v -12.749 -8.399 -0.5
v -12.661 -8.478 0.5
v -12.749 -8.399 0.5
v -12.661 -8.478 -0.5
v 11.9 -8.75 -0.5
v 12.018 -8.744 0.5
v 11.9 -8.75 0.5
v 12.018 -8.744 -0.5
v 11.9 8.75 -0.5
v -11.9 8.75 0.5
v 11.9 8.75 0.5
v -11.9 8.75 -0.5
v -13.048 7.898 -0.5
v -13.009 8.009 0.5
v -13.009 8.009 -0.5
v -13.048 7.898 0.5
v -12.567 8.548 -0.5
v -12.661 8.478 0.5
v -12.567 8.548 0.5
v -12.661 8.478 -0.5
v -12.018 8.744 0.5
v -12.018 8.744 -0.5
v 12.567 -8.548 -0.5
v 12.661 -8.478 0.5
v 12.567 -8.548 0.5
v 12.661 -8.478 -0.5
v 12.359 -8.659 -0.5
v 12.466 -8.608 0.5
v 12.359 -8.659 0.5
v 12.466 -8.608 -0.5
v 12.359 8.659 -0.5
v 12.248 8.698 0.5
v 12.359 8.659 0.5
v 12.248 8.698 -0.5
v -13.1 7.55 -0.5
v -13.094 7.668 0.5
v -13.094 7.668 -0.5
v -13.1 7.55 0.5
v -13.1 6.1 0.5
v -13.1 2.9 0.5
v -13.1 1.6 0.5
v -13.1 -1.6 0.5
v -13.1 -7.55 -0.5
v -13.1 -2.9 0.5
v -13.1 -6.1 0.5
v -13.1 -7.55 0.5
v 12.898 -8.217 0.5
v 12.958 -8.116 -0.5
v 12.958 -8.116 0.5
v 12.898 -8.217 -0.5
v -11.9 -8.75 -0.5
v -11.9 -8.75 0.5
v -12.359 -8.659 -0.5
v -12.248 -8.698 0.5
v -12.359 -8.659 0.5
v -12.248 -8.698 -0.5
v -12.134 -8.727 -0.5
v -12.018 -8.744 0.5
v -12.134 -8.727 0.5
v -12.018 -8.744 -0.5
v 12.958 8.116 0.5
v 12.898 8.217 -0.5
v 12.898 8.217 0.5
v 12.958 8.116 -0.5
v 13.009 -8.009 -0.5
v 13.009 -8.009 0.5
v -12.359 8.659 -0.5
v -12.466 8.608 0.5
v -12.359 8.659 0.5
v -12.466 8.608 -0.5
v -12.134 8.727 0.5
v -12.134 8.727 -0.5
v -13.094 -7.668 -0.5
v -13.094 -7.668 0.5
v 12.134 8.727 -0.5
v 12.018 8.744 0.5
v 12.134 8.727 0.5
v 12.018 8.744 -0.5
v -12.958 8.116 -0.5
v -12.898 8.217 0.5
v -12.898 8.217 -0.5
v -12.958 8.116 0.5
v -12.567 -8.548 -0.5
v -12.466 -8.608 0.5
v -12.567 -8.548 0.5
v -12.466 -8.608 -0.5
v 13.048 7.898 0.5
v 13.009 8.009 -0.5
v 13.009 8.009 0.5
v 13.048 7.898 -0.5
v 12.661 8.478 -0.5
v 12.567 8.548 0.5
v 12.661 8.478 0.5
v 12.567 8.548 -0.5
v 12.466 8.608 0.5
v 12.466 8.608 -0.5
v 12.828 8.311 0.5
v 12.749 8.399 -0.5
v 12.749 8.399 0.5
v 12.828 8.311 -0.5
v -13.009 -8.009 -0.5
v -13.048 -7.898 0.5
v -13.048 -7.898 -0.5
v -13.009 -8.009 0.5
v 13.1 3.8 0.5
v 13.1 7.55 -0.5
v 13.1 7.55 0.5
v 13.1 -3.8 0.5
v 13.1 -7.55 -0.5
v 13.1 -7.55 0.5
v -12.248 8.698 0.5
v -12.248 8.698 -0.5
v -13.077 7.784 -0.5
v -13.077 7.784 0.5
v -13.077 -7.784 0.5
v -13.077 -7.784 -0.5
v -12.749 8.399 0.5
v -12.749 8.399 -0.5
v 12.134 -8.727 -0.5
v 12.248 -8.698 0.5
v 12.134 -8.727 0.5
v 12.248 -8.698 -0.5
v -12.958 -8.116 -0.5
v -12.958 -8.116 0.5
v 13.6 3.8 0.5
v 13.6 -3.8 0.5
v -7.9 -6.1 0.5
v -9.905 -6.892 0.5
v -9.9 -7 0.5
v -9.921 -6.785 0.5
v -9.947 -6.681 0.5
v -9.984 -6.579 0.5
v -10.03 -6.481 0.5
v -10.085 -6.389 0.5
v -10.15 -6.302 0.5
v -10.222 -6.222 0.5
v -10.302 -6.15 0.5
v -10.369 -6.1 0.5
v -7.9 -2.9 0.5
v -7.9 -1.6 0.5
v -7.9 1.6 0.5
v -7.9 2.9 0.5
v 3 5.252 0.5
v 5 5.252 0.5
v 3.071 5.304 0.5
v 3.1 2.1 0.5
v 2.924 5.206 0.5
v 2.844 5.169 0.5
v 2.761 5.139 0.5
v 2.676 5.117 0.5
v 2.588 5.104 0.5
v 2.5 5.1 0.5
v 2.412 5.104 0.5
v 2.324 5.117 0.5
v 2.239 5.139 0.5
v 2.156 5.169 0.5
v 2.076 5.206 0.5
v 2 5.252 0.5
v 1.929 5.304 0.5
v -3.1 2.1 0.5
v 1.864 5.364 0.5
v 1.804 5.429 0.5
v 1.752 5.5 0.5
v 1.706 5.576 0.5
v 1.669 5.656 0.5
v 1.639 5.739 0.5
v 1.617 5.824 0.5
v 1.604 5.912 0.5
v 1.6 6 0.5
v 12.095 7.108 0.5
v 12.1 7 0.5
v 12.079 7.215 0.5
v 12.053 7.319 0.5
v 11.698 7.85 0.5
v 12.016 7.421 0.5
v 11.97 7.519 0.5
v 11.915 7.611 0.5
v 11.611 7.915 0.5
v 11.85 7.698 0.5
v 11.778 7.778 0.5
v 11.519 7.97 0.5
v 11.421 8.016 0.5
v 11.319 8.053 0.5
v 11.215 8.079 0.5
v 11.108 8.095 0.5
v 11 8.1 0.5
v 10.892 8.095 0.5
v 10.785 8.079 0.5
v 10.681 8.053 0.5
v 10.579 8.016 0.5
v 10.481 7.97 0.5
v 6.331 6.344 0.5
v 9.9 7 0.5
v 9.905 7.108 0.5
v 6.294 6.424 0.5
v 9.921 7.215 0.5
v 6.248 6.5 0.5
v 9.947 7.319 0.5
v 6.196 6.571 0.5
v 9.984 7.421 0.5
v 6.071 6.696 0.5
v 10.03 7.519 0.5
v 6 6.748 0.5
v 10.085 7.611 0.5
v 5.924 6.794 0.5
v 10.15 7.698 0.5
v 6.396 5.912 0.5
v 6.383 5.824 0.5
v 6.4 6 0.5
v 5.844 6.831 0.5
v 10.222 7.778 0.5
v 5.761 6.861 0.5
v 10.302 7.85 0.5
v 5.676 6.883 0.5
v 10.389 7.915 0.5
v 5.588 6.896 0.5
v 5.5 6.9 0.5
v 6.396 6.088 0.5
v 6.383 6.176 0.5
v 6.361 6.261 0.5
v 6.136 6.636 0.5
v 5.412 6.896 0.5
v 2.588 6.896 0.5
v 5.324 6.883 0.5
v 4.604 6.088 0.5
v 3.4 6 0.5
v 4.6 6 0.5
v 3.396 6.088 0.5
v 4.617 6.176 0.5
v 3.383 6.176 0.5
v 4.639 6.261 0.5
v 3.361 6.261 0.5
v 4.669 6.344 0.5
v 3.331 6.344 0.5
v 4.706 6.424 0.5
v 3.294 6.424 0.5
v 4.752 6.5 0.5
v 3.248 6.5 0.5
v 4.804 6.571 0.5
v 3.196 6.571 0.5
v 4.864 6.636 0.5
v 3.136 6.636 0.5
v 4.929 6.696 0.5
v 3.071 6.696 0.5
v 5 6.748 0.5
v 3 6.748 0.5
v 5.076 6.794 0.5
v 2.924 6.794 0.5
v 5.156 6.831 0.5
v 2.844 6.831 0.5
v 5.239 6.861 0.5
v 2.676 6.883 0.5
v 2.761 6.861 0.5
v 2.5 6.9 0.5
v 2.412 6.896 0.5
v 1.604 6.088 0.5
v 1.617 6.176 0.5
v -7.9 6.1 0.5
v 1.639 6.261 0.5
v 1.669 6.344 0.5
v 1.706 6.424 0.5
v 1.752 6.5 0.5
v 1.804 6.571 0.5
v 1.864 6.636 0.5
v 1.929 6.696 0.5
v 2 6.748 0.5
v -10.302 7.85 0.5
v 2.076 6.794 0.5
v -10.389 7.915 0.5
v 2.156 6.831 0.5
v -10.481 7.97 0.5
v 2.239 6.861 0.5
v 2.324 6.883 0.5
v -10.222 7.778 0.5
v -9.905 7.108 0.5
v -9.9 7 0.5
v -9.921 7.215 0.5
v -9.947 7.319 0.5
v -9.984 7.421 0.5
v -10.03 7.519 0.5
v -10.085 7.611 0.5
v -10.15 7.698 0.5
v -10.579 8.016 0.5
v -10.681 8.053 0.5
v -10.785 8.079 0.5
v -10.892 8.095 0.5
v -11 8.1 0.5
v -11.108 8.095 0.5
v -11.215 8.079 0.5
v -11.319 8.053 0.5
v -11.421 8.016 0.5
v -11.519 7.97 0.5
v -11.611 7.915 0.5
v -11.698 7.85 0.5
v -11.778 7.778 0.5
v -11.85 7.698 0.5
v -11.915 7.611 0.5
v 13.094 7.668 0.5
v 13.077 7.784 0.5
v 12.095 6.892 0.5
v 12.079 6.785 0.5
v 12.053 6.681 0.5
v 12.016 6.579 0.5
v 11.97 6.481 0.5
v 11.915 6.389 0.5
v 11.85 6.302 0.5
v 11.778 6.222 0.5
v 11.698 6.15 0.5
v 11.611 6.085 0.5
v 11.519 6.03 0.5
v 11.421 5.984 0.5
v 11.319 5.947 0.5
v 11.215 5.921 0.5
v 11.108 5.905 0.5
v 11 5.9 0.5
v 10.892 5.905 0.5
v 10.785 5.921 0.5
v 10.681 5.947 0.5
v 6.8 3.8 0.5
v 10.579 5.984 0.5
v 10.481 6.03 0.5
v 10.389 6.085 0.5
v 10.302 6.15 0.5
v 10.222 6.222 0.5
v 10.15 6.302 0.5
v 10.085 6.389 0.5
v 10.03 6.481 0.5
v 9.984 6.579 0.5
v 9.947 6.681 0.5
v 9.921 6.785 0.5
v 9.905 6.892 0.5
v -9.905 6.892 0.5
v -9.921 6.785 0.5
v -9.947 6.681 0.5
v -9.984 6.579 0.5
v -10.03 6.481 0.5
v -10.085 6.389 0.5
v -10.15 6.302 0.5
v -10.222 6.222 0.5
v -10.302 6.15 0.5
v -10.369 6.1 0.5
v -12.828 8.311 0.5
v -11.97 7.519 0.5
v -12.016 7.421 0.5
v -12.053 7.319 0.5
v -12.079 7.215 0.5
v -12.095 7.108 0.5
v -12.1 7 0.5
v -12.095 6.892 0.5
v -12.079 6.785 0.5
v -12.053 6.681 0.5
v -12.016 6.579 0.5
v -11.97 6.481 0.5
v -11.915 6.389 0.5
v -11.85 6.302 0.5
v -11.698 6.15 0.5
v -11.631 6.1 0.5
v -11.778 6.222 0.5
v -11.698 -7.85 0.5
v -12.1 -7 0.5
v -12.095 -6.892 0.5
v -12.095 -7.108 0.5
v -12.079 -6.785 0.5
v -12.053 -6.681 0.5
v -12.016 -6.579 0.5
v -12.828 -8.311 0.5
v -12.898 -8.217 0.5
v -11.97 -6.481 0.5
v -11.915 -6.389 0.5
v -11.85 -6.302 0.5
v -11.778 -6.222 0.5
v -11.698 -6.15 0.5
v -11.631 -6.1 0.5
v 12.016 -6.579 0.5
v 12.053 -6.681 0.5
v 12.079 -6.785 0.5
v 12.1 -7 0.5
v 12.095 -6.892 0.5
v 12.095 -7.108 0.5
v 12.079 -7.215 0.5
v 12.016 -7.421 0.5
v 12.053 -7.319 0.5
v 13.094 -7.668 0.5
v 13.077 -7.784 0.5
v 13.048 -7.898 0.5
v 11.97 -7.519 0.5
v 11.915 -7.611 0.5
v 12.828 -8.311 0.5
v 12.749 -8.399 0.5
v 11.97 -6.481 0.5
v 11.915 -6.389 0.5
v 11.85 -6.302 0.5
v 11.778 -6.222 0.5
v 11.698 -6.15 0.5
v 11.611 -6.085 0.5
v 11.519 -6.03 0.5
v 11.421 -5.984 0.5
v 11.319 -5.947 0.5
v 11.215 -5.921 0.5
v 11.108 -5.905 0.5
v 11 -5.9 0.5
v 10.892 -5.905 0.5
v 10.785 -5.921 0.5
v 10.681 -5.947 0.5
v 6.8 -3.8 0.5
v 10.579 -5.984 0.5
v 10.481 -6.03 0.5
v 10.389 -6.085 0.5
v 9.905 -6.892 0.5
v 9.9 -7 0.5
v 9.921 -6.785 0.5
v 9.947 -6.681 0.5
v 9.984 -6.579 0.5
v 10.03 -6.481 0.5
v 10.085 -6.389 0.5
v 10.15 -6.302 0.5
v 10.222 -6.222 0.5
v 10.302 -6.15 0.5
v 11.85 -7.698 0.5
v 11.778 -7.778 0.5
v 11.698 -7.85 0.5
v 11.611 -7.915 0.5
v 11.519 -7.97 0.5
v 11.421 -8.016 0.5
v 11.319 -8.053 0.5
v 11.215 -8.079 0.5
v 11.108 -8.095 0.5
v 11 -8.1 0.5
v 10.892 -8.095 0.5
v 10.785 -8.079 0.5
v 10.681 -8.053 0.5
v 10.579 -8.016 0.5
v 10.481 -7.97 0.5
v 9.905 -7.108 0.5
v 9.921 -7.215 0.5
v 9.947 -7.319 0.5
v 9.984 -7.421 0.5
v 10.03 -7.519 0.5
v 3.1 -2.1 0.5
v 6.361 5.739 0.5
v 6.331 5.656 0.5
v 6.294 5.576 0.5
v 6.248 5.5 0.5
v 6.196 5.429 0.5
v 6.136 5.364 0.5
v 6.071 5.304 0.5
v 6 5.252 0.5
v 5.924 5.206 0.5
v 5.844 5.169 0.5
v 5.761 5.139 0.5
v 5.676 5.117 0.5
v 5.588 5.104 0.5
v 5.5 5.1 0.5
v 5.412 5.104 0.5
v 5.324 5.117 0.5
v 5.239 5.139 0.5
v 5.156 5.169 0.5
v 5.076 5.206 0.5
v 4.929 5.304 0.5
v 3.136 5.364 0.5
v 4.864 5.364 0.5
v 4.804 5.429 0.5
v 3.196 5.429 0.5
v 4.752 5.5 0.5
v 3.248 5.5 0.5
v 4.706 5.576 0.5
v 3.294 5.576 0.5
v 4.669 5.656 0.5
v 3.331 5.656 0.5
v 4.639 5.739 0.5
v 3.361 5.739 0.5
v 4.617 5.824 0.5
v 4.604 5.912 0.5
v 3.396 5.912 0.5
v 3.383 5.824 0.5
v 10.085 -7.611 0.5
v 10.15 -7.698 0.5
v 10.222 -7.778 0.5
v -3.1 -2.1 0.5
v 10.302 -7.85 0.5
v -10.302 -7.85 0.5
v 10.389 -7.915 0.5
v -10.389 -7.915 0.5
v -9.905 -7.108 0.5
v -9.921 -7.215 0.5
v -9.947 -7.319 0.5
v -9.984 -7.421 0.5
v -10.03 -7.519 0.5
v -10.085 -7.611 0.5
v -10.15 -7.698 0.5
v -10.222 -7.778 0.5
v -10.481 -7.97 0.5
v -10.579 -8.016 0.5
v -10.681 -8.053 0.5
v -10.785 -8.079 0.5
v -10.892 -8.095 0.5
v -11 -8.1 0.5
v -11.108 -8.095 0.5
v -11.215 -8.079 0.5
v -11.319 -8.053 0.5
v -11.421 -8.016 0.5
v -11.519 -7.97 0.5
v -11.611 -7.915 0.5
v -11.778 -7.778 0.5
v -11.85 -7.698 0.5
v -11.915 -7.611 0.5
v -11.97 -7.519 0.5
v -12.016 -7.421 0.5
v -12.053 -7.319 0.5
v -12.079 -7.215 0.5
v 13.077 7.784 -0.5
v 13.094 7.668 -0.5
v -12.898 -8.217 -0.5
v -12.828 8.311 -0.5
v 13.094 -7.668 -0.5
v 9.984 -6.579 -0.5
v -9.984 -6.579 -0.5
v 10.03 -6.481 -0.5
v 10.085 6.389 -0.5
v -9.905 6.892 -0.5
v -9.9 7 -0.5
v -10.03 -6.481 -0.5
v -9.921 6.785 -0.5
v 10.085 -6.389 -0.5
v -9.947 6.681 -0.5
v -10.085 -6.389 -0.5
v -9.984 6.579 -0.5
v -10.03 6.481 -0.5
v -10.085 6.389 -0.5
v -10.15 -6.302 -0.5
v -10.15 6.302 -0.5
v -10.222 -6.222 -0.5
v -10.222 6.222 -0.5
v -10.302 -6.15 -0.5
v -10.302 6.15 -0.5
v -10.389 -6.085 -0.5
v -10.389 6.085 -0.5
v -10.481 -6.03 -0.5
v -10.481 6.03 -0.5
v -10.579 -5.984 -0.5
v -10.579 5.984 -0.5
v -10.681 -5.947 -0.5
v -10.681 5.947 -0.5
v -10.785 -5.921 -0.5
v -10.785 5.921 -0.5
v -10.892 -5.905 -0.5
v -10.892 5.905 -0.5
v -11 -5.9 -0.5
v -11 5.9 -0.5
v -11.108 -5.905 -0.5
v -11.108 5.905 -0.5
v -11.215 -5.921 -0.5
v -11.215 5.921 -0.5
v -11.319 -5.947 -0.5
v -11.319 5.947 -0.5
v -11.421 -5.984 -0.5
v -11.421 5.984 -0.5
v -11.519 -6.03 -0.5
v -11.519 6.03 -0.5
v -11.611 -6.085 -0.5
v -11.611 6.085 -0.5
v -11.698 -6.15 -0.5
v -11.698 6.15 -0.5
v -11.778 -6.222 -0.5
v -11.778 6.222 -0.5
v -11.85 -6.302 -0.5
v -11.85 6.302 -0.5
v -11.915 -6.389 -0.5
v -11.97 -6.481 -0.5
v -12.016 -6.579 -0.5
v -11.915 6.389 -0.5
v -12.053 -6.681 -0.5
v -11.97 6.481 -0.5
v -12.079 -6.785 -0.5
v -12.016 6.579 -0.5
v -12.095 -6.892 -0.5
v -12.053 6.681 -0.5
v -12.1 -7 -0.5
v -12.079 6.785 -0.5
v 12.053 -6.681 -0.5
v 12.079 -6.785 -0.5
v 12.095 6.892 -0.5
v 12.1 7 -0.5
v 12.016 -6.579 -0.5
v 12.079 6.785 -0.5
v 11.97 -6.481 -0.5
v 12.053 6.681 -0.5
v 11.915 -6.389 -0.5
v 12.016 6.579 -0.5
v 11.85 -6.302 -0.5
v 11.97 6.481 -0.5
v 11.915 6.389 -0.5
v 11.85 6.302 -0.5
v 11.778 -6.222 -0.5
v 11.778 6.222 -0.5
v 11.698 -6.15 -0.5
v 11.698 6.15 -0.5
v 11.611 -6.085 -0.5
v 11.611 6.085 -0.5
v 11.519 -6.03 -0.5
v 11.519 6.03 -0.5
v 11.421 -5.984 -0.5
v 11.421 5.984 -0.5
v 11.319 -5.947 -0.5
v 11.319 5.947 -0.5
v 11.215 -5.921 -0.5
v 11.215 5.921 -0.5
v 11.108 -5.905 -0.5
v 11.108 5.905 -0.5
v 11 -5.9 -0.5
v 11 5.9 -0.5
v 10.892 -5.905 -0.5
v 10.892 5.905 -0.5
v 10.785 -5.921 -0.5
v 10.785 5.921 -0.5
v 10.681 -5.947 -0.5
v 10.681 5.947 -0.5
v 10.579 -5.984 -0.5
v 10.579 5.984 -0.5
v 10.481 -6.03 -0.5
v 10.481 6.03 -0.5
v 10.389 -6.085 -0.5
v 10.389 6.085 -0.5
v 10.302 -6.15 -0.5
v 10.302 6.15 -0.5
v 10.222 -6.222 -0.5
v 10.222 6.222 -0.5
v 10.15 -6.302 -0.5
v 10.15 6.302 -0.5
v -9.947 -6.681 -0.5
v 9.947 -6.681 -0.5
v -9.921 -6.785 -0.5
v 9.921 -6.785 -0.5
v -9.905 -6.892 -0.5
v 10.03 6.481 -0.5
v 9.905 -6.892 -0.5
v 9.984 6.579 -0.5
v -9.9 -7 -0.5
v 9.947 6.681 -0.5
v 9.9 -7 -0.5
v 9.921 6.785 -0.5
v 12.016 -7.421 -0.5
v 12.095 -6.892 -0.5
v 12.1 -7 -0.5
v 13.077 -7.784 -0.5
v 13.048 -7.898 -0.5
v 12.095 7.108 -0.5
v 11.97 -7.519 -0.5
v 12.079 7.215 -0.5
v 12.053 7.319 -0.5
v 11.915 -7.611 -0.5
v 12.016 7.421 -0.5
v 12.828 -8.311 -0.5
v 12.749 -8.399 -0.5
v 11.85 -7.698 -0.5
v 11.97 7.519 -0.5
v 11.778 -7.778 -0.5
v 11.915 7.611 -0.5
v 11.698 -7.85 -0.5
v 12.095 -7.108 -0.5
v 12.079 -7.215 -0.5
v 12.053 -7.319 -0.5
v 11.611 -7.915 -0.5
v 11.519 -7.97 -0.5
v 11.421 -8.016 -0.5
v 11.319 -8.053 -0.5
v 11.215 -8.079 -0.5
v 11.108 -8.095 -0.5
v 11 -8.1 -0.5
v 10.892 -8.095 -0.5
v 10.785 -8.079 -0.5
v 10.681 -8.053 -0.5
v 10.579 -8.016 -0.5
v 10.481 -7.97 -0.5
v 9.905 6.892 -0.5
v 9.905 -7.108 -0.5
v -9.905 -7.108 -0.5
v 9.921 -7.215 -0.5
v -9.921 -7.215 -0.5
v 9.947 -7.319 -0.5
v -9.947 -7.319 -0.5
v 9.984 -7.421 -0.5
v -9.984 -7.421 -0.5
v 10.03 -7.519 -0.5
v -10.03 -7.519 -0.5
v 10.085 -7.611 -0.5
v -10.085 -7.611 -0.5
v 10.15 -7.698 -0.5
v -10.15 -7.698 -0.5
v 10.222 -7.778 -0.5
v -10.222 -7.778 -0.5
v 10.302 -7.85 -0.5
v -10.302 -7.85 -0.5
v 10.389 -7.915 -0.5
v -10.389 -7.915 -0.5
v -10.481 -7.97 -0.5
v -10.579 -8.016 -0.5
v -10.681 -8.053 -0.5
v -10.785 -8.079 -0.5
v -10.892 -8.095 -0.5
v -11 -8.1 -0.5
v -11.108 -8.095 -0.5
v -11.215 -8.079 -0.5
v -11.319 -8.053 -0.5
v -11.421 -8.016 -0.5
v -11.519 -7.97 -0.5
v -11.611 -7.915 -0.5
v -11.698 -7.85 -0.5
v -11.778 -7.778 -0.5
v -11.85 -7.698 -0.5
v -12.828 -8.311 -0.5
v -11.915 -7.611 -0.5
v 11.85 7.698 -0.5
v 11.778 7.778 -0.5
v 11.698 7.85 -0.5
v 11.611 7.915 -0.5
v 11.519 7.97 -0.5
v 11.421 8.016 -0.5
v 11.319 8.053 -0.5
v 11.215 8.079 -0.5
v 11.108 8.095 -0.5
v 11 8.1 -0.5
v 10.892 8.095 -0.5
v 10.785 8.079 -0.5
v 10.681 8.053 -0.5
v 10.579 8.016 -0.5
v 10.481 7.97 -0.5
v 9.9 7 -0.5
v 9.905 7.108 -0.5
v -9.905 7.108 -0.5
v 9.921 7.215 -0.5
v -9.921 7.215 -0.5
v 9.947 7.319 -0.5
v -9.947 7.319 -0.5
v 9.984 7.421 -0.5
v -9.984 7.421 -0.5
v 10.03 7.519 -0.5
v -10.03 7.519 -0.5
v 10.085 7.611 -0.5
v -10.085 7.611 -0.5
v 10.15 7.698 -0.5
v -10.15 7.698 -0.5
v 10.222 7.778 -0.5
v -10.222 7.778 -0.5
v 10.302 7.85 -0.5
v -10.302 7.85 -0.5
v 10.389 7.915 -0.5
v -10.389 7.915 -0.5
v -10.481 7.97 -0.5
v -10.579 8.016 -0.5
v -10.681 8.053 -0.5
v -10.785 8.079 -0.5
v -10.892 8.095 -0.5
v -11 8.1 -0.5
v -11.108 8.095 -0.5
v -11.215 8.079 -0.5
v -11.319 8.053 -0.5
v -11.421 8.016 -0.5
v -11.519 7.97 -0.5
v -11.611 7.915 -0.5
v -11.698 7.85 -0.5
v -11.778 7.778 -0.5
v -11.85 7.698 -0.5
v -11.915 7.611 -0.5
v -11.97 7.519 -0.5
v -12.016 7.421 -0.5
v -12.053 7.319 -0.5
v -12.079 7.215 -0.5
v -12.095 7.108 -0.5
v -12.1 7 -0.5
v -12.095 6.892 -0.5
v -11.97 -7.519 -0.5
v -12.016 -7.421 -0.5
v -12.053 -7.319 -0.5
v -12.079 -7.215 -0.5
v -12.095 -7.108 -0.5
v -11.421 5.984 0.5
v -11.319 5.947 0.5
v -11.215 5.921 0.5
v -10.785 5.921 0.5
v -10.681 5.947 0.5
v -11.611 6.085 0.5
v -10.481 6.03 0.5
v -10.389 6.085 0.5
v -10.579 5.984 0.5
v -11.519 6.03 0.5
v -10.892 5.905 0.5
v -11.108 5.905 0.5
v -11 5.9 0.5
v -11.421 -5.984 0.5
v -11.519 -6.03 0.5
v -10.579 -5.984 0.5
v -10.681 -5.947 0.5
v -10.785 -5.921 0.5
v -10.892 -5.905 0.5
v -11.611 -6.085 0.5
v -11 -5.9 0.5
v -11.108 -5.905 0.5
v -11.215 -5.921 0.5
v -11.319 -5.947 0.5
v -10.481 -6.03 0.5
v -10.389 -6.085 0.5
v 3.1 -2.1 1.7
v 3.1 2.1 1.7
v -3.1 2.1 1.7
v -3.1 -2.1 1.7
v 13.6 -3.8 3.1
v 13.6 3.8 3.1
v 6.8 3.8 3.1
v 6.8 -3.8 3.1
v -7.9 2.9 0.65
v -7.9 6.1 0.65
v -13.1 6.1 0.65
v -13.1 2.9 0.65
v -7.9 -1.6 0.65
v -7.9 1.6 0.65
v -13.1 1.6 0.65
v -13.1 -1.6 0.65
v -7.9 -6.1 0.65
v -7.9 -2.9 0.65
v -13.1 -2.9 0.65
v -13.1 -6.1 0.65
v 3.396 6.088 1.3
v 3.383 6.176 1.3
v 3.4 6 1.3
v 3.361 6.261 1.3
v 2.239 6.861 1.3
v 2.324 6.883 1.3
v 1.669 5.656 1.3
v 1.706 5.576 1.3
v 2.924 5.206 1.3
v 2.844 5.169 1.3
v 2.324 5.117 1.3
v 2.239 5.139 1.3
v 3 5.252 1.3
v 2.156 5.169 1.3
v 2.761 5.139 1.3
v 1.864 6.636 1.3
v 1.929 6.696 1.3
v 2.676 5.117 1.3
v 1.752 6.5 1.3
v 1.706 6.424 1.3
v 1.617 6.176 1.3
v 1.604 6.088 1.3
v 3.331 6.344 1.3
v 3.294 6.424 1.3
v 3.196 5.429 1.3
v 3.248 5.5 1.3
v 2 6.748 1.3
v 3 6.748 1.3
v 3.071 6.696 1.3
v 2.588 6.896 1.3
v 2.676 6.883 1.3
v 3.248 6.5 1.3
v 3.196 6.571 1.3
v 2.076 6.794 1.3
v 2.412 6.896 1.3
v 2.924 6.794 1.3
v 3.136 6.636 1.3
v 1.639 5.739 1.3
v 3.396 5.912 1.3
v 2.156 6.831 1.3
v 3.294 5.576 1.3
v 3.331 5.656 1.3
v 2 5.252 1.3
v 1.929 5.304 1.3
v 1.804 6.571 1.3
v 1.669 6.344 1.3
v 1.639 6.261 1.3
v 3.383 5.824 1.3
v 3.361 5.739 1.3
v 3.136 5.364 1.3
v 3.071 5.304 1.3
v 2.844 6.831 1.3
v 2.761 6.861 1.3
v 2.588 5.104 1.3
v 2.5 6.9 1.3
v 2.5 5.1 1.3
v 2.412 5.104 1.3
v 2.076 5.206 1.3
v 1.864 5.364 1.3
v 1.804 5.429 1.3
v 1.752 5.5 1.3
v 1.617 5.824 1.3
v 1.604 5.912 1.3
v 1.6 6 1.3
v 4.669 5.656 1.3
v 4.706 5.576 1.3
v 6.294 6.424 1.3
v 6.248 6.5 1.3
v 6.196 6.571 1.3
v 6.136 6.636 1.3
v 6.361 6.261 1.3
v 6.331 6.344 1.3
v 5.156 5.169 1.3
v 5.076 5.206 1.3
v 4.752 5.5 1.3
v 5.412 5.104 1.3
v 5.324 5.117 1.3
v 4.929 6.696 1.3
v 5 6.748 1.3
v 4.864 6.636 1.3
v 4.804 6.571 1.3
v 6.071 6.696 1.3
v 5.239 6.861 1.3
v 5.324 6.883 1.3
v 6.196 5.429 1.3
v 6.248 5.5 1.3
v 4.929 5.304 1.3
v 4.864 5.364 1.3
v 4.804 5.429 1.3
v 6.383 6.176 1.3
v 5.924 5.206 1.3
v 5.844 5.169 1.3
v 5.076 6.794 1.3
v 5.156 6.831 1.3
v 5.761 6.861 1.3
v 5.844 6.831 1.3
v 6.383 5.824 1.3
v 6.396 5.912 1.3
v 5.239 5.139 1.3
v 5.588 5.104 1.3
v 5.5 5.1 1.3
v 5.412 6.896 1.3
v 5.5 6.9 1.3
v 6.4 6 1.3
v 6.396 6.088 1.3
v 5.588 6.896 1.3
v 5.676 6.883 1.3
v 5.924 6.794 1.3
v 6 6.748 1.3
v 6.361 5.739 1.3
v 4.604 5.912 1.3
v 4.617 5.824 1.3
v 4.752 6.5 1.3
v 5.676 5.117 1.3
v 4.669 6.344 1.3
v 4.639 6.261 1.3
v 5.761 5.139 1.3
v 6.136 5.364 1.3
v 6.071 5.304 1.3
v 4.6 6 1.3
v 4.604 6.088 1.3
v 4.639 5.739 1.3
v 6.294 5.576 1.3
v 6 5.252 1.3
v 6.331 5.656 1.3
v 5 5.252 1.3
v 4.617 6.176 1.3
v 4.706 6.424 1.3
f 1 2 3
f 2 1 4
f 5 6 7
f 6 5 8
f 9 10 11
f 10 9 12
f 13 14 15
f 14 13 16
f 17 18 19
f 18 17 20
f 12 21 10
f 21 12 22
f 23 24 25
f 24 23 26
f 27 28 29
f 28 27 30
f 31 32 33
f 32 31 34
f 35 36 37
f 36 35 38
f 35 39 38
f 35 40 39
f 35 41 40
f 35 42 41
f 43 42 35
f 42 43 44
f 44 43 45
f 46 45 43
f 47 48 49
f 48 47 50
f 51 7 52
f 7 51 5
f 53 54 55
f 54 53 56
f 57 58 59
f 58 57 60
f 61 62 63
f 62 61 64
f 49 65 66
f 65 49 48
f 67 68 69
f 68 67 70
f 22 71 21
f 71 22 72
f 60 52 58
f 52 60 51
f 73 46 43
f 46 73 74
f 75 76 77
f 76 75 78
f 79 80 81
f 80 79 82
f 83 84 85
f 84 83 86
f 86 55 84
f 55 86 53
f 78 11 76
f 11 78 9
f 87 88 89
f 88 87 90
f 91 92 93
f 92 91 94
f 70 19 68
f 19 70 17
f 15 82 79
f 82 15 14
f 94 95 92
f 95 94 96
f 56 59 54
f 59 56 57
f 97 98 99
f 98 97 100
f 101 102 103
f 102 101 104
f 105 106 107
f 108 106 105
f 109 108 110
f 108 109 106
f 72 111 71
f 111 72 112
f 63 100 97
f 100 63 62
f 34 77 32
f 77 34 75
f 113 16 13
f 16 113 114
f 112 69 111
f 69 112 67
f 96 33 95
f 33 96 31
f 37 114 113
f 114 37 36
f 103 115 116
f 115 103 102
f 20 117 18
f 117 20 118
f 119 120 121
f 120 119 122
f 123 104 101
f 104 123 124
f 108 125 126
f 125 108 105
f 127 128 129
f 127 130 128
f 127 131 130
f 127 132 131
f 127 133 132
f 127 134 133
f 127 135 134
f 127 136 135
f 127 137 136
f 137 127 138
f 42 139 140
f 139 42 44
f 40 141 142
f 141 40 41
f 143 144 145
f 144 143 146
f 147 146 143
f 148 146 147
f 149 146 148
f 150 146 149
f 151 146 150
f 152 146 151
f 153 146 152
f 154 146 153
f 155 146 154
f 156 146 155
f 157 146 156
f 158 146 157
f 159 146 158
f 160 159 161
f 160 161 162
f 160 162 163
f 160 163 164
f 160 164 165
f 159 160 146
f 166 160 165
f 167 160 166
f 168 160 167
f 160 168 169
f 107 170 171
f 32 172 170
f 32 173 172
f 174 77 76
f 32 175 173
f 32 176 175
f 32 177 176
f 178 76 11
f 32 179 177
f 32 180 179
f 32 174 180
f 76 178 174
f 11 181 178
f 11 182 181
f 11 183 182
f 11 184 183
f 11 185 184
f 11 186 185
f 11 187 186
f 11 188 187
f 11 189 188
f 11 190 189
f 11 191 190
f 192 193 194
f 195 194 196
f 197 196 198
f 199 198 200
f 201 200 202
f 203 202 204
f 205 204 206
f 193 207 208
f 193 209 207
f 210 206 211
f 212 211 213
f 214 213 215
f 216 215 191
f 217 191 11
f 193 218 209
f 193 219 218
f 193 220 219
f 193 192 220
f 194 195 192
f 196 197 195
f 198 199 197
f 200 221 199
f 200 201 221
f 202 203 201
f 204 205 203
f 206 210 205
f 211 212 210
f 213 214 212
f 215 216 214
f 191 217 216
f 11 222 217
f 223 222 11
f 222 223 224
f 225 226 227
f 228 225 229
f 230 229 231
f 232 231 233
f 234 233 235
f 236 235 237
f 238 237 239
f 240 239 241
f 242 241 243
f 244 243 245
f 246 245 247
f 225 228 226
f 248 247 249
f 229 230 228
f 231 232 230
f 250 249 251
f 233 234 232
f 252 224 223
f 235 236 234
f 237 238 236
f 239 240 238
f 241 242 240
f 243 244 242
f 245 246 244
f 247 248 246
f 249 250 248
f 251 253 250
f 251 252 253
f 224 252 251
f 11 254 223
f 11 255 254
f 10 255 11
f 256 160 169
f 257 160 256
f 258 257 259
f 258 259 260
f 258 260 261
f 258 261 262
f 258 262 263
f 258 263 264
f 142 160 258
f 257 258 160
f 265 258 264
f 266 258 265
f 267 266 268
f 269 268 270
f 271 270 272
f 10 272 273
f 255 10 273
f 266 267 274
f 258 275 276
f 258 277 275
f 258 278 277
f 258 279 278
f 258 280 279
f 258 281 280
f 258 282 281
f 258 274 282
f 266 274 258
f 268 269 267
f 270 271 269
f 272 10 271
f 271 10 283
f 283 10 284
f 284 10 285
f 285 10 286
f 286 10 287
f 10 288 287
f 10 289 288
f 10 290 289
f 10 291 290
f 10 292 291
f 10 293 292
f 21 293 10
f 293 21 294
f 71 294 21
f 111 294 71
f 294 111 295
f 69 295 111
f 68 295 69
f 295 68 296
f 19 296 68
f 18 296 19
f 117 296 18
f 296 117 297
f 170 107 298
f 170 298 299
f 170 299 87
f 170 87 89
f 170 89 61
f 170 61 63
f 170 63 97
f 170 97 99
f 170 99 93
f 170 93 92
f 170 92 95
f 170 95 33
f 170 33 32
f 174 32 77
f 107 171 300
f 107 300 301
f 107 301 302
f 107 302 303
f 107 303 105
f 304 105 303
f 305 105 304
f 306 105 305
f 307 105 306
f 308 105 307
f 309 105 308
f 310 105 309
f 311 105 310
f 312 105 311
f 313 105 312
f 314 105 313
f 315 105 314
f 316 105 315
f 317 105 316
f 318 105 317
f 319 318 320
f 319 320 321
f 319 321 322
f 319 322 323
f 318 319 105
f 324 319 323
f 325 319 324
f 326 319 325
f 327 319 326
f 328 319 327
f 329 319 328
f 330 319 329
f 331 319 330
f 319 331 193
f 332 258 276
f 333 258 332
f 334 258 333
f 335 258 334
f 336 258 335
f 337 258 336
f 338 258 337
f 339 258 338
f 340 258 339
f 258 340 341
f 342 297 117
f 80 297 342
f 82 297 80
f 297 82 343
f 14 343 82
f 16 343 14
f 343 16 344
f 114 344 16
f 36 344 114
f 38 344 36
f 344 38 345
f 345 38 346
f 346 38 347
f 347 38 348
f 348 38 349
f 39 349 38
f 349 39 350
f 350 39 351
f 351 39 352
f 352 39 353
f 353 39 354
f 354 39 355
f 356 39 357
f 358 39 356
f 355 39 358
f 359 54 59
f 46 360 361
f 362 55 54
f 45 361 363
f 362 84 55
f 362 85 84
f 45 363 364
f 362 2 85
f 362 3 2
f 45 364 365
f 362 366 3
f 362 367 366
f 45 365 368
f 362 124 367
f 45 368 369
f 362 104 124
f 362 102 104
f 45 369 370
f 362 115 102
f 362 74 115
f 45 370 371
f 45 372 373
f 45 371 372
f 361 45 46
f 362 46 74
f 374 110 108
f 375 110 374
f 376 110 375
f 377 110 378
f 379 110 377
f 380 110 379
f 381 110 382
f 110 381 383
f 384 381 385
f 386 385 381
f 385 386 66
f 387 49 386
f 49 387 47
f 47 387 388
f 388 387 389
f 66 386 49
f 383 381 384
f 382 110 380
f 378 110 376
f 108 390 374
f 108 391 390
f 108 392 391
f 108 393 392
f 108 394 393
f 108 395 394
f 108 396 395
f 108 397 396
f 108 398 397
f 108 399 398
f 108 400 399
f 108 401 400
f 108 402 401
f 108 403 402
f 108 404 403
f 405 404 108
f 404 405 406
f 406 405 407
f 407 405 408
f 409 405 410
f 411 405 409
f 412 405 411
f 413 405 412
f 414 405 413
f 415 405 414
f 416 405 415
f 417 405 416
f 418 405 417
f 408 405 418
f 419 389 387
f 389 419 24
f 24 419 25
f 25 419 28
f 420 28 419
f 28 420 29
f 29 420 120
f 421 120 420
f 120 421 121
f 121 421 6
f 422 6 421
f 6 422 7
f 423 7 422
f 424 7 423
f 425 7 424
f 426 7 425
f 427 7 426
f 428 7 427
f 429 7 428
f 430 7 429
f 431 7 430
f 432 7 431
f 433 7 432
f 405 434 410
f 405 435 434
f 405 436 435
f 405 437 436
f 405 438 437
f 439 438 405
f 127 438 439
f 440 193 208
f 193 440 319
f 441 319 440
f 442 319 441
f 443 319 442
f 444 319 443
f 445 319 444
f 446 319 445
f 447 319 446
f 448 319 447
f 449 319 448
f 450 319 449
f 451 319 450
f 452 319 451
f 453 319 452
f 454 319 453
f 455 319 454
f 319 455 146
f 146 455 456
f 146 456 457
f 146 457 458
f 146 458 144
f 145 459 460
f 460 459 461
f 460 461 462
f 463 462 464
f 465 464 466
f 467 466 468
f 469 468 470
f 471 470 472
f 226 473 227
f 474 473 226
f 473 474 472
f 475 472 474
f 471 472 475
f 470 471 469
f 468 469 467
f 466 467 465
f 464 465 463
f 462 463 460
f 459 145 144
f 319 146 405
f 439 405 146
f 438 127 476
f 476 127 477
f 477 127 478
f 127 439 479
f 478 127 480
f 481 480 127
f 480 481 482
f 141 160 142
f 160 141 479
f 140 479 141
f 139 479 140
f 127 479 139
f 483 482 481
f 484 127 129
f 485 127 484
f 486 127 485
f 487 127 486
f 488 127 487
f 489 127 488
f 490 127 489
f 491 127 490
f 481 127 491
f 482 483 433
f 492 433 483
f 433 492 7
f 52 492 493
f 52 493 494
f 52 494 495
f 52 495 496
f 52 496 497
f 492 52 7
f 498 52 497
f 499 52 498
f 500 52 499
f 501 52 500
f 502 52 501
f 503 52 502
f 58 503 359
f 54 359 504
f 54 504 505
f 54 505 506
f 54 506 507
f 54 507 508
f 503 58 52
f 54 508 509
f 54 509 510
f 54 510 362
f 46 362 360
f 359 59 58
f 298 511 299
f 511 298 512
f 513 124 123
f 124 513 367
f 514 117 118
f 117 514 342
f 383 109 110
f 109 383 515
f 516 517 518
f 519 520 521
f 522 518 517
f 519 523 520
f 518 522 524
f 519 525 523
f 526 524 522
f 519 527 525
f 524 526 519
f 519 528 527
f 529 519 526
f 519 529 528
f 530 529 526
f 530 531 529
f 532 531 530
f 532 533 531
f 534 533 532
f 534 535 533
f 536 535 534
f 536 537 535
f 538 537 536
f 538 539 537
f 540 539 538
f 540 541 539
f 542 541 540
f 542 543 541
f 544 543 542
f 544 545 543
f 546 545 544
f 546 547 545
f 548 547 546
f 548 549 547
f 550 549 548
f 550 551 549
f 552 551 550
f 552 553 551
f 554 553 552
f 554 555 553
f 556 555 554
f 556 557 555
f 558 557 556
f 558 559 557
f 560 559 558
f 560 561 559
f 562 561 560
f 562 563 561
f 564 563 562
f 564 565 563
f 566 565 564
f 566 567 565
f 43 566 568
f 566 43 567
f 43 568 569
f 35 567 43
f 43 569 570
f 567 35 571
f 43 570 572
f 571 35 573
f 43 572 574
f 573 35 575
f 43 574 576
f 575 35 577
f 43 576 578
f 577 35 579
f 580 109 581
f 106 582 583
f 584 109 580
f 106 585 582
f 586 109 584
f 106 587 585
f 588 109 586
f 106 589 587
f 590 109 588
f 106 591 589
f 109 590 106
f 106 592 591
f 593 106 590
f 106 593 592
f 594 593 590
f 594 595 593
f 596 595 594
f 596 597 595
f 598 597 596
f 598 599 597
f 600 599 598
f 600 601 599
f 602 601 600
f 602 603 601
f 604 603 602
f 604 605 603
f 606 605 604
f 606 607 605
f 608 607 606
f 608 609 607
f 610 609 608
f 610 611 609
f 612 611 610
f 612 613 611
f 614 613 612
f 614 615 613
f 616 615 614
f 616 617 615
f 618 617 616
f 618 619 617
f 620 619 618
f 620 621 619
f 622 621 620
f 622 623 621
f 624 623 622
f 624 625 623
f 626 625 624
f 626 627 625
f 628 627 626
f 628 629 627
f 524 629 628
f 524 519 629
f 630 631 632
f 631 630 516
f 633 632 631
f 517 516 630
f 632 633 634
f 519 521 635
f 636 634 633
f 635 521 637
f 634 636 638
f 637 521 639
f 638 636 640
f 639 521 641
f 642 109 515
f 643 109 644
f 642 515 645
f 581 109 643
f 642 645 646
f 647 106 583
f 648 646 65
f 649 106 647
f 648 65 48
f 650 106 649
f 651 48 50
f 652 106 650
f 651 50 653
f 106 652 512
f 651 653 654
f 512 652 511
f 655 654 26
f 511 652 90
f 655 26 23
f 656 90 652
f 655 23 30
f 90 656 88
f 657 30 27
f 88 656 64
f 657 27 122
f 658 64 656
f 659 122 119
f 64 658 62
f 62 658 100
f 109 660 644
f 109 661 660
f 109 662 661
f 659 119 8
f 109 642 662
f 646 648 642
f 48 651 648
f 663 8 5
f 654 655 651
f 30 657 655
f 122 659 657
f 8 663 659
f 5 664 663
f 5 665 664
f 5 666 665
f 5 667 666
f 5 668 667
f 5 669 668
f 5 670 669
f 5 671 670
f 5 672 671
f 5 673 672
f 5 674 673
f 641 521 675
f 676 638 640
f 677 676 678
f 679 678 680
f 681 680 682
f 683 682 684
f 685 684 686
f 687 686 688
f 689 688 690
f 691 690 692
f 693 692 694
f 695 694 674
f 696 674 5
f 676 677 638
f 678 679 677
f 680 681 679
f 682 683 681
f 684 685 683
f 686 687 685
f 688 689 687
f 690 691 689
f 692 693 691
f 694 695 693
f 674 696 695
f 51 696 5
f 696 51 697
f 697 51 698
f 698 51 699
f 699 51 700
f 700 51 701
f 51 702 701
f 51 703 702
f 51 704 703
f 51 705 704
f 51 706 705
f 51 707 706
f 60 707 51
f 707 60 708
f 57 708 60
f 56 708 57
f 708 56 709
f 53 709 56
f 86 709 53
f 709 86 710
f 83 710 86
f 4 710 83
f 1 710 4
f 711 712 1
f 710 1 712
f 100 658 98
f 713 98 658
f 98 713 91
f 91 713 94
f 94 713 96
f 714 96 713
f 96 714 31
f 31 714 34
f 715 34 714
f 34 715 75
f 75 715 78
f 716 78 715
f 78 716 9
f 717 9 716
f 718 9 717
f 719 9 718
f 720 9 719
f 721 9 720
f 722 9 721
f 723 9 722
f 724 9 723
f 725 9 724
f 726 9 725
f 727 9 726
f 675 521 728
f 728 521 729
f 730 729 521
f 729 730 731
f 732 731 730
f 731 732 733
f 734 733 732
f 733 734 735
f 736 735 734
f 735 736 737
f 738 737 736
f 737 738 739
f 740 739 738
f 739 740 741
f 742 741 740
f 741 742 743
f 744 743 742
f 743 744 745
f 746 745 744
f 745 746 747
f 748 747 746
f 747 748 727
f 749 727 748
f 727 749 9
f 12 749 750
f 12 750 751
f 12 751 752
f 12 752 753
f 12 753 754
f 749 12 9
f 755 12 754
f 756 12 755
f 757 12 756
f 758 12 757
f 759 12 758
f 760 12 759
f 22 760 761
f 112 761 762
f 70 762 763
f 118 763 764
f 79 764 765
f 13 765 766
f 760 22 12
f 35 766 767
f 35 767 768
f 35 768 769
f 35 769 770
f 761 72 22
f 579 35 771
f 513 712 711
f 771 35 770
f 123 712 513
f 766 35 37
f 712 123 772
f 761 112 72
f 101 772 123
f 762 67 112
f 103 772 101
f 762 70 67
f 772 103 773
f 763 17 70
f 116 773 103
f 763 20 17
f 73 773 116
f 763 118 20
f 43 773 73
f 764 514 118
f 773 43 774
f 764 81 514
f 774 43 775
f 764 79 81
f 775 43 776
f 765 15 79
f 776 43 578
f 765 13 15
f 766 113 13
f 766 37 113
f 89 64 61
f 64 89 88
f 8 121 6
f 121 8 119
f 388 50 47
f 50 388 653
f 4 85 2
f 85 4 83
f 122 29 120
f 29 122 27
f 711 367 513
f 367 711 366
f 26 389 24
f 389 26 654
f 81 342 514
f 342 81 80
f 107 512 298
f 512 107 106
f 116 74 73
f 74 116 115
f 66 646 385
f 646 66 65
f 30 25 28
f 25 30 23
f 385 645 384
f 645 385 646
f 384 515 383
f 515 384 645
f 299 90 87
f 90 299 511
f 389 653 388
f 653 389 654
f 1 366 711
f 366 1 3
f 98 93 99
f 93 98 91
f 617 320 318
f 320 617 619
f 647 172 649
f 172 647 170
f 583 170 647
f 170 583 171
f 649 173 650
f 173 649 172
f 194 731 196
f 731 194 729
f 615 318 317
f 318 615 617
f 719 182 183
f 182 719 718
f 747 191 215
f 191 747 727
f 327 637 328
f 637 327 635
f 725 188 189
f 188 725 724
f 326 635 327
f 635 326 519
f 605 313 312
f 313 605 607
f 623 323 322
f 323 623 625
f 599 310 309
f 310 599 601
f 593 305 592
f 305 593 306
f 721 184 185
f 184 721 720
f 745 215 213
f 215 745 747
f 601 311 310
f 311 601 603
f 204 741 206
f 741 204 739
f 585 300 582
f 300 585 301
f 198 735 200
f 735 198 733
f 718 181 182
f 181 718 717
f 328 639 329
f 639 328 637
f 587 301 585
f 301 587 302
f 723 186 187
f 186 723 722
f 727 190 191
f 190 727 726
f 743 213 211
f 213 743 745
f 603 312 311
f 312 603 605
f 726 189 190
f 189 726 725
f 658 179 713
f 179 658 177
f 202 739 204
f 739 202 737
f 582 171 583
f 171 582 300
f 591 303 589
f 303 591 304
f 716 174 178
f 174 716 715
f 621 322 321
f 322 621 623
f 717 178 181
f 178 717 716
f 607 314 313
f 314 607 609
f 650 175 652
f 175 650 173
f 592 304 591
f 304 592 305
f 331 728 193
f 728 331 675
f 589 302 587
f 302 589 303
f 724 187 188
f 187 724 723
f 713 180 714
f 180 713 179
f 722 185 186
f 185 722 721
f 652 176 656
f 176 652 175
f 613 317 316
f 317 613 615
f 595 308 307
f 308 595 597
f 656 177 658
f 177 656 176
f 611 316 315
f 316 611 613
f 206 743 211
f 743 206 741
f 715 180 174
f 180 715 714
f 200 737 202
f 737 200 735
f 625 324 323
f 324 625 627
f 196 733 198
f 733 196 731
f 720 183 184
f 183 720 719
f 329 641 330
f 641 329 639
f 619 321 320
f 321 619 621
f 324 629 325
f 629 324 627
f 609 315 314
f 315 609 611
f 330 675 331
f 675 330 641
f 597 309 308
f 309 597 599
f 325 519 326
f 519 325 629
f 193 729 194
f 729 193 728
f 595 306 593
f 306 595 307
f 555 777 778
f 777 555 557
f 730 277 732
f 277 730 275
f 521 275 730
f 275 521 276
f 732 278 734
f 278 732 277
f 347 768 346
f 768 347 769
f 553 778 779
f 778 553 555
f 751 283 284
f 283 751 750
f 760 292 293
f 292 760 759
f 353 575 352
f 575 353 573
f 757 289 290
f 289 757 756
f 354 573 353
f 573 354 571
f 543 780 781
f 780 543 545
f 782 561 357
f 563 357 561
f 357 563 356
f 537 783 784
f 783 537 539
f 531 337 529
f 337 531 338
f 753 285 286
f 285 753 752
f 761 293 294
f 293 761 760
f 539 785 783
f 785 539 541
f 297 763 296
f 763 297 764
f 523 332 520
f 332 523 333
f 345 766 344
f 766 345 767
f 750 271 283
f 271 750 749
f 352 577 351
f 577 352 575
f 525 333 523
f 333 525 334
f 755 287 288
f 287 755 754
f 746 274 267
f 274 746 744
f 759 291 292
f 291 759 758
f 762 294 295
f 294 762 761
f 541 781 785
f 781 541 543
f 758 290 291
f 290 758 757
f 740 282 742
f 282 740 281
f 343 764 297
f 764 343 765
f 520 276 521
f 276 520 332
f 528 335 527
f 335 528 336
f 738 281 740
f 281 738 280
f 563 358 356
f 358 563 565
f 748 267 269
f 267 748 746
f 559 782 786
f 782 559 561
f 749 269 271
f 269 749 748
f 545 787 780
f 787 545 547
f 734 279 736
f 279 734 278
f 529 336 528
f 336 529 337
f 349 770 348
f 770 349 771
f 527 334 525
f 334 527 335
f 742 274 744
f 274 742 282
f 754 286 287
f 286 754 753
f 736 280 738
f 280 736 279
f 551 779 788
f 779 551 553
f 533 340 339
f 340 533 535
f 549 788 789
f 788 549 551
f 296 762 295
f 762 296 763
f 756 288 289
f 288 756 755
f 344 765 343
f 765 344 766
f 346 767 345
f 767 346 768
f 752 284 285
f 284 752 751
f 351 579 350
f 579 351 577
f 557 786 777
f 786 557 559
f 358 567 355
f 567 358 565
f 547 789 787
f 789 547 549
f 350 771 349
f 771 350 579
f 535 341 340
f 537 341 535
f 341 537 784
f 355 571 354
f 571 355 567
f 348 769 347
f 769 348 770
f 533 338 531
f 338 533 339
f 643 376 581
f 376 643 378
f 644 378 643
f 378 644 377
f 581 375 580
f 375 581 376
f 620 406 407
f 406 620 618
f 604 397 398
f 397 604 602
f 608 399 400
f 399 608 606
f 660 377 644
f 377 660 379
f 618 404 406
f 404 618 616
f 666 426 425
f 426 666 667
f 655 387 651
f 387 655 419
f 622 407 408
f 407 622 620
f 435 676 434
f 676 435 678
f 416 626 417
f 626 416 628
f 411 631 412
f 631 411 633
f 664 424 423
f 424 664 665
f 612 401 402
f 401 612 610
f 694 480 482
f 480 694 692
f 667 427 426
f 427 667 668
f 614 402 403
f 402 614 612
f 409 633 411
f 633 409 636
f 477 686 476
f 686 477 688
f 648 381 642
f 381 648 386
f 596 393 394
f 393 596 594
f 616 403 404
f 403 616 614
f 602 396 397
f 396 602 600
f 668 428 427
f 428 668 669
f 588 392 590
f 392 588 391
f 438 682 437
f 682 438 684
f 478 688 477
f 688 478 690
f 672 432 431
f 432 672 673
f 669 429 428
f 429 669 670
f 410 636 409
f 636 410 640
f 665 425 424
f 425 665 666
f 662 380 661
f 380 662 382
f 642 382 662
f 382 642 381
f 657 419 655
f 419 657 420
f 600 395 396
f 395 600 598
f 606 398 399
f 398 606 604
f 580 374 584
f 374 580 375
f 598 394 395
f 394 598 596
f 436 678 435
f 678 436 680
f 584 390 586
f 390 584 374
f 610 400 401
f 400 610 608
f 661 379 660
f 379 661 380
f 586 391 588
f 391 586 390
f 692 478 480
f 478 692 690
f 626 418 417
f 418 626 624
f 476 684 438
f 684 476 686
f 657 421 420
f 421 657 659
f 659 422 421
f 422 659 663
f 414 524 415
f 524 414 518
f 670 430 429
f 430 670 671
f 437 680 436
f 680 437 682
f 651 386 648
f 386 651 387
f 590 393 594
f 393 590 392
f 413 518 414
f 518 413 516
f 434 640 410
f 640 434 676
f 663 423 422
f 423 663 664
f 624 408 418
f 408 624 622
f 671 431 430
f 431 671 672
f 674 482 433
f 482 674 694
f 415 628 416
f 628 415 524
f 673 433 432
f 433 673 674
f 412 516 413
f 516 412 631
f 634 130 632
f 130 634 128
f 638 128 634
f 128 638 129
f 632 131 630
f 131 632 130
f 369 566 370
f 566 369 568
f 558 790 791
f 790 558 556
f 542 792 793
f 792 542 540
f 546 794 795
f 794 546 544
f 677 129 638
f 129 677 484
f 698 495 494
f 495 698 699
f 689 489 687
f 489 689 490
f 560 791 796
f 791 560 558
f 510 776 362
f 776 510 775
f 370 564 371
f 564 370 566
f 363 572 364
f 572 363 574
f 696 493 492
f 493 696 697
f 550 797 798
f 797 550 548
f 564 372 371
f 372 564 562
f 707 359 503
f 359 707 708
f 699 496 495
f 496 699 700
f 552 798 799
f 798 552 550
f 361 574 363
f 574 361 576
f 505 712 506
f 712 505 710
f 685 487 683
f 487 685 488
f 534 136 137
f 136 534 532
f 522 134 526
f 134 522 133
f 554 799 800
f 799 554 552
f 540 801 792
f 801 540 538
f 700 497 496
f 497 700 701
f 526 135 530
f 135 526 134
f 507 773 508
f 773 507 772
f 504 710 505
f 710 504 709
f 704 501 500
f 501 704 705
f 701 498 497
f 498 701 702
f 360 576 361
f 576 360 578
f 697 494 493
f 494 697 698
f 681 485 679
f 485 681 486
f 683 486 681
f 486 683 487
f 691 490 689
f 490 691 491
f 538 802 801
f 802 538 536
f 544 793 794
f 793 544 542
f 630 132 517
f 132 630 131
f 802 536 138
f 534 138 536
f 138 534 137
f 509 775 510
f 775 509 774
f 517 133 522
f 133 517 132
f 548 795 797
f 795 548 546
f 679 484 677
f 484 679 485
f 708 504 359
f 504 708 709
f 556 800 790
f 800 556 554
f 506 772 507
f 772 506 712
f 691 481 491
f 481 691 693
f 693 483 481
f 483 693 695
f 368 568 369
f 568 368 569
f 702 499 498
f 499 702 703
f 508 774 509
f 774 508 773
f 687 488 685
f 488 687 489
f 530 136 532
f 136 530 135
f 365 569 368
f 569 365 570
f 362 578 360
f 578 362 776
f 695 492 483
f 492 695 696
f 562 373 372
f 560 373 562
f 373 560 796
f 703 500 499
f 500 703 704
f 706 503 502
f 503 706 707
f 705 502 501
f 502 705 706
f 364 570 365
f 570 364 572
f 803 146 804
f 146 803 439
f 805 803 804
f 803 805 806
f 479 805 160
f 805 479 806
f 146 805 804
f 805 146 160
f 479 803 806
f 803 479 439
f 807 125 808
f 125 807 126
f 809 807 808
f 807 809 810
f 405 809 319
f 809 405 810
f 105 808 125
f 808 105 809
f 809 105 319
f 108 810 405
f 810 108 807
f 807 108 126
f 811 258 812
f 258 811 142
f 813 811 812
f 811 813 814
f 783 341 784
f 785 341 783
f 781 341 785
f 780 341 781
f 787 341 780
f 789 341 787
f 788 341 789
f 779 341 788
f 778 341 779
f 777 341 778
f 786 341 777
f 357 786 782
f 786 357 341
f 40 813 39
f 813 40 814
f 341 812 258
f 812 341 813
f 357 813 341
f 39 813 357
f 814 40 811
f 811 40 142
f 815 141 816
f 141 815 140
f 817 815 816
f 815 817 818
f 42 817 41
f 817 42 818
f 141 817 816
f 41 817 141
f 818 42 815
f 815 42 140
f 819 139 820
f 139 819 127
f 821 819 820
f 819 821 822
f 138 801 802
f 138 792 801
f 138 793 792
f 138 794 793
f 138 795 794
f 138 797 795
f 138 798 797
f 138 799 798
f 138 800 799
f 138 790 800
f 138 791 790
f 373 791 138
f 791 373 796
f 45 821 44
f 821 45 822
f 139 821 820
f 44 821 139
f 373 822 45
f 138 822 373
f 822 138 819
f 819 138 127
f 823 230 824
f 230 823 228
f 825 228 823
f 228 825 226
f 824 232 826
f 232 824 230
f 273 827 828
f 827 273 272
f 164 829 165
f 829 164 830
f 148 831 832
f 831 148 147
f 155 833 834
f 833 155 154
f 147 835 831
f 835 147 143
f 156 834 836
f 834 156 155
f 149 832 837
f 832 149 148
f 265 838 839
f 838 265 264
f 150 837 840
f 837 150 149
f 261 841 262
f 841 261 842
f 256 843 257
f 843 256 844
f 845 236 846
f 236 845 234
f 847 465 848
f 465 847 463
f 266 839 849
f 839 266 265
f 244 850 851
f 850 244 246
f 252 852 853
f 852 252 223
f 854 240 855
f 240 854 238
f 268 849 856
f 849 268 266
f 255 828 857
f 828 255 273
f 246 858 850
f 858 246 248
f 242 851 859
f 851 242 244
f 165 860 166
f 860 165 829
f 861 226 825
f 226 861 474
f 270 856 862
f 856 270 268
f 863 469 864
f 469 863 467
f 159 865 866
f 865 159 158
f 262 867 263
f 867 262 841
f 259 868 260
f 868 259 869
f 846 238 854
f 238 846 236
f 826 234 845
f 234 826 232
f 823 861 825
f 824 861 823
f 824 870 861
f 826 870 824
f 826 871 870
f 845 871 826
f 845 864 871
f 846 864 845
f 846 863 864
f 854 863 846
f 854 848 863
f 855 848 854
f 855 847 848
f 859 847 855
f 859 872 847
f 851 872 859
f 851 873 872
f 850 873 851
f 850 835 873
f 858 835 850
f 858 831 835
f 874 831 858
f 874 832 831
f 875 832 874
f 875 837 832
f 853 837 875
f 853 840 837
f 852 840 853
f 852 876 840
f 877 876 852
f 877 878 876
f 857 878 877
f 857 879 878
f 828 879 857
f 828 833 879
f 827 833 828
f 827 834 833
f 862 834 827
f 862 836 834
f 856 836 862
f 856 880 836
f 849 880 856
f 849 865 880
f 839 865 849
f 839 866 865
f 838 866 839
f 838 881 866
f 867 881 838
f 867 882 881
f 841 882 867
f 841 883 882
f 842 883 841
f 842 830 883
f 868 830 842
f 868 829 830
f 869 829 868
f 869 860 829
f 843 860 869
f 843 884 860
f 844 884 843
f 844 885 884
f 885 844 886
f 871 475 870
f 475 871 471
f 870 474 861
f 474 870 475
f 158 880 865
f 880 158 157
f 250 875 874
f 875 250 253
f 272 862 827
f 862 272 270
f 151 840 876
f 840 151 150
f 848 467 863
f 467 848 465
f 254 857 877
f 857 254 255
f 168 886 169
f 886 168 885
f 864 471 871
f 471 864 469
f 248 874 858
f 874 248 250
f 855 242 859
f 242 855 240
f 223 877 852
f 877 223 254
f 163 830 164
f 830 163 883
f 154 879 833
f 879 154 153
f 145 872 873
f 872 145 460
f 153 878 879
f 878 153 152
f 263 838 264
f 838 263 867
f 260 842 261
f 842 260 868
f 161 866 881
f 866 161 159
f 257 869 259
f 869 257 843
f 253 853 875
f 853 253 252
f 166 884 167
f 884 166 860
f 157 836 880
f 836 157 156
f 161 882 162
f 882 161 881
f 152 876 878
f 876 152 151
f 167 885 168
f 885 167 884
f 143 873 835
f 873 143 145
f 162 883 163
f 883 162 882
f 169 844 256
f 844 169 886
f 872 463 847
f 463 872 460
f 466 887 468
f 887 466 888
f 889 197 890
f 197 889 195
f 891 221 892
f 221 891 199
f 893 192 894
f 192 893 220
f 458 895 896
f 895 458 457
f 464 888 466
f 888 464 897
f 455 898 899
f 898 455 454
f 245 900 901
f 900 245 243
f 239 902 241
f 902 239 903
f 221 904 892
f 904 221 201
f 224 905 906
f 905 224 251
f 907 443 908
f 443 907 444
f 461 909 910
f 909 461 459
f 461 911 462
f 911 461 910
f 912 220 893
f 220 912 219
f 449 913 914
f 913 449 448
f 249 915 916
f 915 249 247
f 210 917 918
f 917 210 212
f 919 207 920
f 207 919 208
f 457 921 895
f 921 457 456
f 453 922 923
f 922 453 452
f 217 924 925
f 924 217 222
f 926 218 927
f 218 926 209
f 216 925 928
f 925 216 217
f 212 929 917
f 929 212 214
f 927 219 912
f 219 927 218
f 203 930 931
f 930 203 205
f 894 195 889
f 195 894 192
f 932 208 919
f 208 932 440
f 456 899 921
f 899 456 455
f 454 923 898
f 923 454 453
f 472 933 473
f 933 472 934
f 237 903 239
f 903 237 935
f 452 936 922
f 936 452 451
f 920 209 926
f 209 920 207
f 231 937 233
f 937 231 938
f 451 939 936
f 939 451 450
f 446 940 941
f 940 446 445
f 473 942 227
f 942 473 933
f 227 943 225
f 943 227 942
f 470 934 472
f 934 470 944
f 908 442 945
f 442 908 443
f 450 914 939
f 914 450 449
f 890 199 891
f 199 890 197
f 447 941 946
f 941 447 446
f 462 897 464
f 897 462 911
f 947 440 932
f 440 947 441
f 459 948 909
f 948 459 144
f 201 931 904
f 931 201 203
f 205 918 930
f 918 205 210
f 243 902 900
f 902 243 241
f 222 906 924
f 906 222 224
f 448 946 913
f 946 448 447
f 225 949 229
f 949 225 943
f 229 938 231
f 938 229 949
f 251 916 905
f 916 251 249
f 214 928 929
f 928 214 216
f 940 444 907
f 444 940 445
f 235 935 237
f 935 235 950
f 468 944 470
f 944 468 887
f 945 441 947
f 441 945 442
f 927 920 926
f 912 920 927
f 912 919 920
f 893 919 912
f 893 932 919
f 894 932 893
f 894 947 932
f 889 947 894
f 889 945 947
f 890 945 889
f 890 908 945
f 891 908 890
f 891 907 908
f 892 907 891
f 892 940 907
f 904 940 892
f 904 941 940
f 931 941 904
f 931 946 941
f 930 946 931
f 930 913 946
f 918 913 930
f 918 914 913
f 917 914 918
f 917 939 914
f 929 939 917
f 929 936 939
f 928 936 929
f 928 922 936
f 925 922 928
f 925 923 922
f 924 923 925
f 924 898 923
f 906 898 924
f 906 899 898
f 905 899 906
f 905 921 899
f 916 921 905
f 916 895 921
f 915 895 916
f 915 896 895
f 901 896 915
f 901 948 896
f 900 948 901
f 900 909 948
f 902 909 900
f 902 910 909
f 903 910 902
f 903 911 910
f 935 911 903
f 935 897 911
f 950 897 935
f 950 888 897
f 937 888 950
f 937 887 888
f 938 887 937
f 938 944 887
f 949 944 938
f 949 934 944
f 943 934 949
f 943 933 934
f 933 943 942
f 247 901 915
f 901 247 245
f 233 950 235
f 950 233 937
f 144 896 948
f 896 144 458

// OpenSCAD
$fn=64;

module pcb(size=[26.2,17.5,1.0], corner_r=1.2){
    x=size[0]; y=size[1]; z=size[2];
    linear_extrude(height=z, center=true)
        offset(r=corner_r)
            square([x-2*corner_r, y-2*corner_r], center=true);
}

module mount_hole(d=2.2, h=3.0){
    cylinder(d=d, h=h, center=true);
}

module pad(w=3.0, l=5.0, t=0.15){
    translate([0,0,0.5 + t/2])
        cube([l,w,t], center=true);
}

module usb_micro_outline(w=7.5, l=6.8, h=2.6){
    translate([0,0,0.5 + h/2])
        cube([l,w,h], center=true);
}

module chip(w=4.0, l=6.0, h=1.2){
    translate([0,0,0.5 + h/2])
        cube([l,w,h], center=true);
}

module led(d=1.8, h=0.8){
    translate([0,0,0.5 + h/2])
        cylinder(d=d, h=h, center=true);
}

module battery_charger_module(){
    difference(){
        pcb([26.2,17.5,1.0], corner_r=1.2);

        translate([ 11.0,  7.0, 0]) mount_hole(d=2.2, h=4.0);
        translate([-11.0,  7.0, 0]) mount_hole(d=2.2, h=4.0);
        translate([ 11.0, -7.0, 0]) mount_hole(d=2.2, h=4.0);
        translate([-11.0, -7.0, 0]) mount_hole(d=2.2, h=4.0);
    }

    translate([ 0,  0, 0]) chip(w=4.2, l=6.2, h=1.2);

    translate([ 10.2, 0, 0]) usb_micro_outline(w=7.6, l=6.8, h=2.6);

    translate([-10.5,  4.5, 0]) pad(w=3.2, l=5.2, t=0.15);
    translate([-10.5,  0.0, 0]) pad(w=3.2, l=5.2, t=0.15);
    translate([-10.5, -4.5, 0]) pad(w=3.2, l=5.2, t=0.15);

    translate([ 2.5,  6.0, 0]) led(d=1.8, h=0.8);
    translate([ 5.5,  6.0, 0]) led(d=1.8, h=0.8);
}

battery_charger_module();
